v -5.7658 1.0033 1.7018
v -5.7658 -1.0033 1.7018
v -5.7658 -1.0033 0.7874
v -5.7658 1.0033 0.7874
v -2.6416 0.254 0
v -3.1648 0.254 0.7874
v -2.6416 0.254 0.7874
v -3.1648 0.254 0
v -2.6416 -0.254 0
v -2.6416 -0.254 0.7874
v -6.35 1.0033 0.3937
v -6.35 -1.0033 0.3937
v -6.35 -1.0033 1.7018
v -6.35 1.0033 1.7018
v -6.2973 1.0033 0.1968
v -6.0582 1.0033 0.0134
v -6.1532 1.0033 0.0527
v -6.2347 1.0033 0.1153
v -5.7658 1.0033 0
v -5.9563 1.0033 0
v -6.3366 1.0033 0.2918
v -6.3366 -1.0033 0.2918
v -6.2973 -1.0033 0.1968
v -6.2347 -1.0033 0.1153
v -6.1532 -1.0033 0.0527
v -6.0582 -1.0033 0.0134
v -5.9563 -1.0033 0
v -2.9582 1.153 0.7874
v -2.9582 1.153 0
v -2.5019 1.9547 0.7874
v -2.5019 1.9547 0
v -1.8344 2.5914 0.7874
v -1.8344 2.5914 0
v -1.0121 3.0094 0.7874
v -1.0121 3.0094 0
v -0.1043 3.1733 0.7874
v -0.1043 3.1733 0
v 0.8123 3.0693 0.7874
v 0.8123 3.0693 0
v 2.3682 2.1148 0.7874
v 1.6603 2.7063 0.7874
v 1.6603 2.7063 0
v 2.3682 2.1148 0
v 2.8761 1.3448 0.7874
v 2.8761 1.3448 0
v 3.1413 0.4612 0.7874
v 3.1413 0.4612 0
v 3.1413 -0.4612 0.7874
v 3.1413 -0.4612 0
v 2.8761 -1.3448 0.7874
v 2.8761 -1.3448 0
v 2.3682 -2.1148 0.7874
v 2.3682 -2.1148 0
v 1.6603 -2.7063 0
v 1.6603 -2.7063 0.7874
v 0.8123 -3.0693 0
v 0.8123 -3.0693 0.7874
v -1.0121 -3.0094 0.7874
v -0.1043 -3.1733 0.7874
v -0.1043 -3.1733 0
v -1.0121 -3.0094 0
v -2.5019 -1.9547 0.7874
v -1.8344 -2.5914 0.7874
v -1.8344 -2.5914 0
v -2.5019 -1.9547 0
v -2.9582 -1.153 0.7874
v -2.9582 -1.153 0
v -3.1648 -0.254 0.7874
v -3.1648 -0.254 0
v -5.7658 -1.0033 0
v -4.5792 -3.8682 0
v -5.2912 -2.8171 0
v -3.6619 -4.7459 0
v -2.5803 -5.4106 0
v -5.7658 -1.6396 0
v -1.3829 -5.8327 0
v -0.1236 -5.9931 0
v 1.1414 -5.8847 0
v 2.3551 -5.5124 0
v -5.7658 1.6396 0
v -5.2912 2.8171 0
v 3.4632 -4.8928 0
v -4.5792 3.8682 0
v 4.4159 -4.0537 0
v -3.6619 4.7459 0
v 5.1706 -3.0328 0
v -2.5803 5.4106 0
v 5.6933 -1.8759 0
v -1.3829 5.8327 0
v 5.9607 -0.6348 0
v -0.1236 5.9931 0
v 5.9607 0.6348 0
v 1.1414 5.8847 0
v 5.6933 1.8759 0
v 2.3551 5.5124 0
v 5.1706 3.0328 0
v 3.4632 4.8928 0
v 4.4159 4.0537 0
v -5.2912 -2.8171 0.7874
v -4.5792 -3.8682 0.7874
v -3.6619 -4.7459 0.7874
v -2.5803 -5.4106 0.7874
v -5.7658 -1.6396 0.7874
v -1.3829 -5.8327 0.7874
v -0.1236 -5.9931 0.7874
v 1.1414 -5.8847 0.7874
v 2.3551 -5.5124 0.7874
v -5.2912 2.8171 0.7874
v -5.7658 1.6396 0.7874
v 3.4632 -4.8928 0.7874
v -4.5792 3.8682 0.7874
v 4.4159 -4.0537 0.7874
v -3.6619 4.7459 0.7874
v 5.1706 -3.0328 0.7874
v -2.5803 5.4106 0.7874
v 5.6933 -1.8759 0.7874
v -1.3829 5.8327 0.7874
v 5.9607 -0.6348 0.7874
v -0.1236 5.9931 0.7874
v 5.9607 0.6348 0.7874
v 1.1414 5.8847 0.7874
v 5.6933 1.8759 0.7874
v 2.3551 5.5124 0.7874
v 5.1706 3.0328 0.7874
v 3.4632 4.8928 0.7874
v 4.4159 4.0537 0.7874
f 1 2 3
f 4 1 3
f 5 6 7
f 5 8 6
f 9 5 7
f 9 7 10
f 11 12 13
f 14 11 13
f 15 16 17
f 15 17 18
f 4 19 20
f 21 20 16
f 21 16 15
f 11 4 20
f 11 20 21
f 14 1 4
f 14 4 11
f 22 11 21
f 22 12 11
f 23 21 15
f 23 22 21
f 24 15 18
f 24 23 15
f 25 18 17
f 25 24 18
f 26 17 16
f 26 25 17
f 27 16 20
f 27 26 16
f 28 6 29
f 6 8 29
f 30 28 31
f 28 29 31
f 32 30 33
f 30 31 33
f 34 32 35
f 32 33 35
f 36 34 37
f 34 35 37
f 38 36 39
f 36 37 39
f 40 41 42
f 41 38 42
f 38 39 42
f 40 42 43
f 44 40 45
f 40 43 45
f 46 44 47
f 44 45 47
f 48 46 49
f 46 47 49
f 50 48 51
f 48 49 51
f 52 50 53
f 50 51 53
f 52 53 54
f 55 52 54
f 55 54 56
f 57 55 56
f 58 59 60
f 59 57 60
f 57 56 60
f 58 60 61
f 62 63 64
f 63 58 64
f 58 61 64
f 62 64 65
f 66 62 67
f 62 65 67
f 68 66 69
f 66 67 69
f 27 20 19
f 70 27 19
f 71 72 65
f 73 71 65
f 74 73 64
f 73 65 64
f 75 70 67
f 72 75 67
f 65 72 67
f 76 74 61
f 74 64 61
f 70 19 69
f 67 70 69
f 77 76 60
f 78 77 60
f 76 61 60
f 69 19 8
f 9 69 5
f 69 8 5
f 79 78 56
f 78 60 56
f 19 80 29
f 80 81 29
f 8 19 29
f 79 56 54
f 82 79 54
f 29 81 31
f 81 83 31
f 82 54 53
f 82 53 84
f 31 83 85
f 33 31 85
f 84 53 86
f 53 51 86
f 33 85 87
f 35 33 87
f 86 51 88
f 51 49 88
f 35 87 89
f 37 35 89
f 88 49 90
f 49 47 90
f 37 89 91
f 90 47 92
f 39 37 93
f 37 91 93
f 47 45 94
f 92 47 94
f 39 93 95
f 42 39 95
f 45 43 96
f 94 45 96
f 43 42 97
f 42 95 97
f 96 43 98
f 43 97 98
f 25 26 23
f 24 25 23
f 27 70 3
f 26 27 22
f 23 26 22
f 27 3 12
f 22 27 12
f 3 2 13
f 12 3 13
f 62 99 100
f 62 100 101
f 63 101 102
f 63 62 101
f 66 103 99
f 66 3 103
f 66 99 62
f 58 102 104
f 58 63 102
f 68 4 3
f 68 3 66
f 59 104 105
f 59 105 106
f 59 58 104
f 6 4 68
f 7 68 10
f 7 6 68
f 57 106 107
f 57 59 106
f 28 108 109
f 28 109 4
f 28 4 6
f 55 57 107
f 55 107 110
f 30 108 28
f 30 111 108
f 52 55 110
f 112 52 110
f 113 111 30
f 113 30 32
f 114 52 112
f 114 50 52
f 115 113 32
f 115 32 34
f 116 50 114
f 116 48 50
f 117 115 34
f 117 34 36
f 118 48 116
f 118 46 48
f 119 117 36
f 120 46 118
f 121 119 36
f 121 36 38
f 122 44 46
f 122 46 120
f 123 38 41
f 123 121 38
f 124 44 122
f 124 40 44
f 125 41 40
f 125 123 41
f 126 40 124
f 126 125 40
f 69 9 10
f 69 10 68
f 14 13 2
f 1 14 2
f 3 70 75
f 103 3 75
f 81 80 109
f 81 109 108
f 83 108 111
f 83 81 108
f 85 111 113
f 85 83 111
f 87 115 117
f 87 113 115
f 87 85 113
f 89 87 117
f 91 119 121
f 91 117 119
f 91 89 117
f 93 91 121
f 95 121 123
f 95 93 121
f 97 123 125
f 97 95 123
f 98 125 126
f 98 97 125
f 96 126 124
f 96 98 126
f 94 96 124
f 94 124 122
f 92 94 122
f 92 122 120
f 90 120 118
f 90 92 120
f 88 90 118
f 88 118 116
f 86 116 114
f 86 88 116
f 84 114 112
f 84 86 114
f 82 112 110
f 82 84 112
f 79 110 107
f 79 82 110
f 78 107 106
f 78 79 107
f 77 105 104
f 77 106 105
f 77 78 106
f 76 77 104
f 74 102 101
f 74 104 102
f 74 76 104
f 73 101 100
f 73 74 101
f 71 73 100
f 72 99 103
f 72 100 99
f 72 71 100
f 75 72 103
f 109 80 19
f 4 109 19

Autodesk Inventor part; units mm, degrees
sketch "Sketch_4" plane through (0, 0, 0) normal (0, 0, 1) x (1, 0, 0)
  arc A0 (-5.7658, -1.6396) -> (-5.7658, 1.6396) centre (0, 0) ccw
  line L0 (-5.7658, 1.6396) -> (-5.7658, -1.6396)
  line L1 (-3.1648, 0.254) -> (-2.6416, 0.254)
  line L2 (-2.6416, 0.254) -> (-2.6416, -0.254)
  line L3 (-2.6416, -0.254) -> (-3.1648, -0.254)
  arc A1 (-3.1648, -0.254) -> (-3.1648, 0.254) centre (0, 0) ccw
extrude "Extrusion1" add sketch "Sketch_4" along normal blind 0.7874
sketch "Sketch_2" plane through (0, 0, 0) normal (0, 1, 0) x (-1, 0, 0)
  line L0 (6.35, 1.7018) -> (5.7658, 1.7018)
  line L1 (5.7658, 1.7018) -> (5.7658, 0.7874)
  line L2 (5.7658, 0.7874) -> (4.4069, 0.7874)
  line L3 (4.4069, 0.7874) -> (4.4069, 0)
  line L4 (4.4069, 0) -> (5.9563, 0)
  arc A0 (5.9563, 0) -> (6.35, 0.3937) centre (5.9563, 0.3937) ccw
  line L5 (6.35, 0.3937) -> (6.35, 1.7018)
extrude "Extrusion2" add sketch "Sketch_2" along normal mid plane 2.0066
ref_plane "ring_XY" through (0, 0, 0.3937) normal (0, 0, 1) x (1, 0, 0)
ref_plane "ring_YZ" through (0, 0, 0.3937) normal (1, 0, 0) x (0, 1, 0)
ref_plane "ring_ZX" through (0, 0, 0.3937) normal (0, 1, 0) x (0, 0, 1)
properties part number "AT507H"
